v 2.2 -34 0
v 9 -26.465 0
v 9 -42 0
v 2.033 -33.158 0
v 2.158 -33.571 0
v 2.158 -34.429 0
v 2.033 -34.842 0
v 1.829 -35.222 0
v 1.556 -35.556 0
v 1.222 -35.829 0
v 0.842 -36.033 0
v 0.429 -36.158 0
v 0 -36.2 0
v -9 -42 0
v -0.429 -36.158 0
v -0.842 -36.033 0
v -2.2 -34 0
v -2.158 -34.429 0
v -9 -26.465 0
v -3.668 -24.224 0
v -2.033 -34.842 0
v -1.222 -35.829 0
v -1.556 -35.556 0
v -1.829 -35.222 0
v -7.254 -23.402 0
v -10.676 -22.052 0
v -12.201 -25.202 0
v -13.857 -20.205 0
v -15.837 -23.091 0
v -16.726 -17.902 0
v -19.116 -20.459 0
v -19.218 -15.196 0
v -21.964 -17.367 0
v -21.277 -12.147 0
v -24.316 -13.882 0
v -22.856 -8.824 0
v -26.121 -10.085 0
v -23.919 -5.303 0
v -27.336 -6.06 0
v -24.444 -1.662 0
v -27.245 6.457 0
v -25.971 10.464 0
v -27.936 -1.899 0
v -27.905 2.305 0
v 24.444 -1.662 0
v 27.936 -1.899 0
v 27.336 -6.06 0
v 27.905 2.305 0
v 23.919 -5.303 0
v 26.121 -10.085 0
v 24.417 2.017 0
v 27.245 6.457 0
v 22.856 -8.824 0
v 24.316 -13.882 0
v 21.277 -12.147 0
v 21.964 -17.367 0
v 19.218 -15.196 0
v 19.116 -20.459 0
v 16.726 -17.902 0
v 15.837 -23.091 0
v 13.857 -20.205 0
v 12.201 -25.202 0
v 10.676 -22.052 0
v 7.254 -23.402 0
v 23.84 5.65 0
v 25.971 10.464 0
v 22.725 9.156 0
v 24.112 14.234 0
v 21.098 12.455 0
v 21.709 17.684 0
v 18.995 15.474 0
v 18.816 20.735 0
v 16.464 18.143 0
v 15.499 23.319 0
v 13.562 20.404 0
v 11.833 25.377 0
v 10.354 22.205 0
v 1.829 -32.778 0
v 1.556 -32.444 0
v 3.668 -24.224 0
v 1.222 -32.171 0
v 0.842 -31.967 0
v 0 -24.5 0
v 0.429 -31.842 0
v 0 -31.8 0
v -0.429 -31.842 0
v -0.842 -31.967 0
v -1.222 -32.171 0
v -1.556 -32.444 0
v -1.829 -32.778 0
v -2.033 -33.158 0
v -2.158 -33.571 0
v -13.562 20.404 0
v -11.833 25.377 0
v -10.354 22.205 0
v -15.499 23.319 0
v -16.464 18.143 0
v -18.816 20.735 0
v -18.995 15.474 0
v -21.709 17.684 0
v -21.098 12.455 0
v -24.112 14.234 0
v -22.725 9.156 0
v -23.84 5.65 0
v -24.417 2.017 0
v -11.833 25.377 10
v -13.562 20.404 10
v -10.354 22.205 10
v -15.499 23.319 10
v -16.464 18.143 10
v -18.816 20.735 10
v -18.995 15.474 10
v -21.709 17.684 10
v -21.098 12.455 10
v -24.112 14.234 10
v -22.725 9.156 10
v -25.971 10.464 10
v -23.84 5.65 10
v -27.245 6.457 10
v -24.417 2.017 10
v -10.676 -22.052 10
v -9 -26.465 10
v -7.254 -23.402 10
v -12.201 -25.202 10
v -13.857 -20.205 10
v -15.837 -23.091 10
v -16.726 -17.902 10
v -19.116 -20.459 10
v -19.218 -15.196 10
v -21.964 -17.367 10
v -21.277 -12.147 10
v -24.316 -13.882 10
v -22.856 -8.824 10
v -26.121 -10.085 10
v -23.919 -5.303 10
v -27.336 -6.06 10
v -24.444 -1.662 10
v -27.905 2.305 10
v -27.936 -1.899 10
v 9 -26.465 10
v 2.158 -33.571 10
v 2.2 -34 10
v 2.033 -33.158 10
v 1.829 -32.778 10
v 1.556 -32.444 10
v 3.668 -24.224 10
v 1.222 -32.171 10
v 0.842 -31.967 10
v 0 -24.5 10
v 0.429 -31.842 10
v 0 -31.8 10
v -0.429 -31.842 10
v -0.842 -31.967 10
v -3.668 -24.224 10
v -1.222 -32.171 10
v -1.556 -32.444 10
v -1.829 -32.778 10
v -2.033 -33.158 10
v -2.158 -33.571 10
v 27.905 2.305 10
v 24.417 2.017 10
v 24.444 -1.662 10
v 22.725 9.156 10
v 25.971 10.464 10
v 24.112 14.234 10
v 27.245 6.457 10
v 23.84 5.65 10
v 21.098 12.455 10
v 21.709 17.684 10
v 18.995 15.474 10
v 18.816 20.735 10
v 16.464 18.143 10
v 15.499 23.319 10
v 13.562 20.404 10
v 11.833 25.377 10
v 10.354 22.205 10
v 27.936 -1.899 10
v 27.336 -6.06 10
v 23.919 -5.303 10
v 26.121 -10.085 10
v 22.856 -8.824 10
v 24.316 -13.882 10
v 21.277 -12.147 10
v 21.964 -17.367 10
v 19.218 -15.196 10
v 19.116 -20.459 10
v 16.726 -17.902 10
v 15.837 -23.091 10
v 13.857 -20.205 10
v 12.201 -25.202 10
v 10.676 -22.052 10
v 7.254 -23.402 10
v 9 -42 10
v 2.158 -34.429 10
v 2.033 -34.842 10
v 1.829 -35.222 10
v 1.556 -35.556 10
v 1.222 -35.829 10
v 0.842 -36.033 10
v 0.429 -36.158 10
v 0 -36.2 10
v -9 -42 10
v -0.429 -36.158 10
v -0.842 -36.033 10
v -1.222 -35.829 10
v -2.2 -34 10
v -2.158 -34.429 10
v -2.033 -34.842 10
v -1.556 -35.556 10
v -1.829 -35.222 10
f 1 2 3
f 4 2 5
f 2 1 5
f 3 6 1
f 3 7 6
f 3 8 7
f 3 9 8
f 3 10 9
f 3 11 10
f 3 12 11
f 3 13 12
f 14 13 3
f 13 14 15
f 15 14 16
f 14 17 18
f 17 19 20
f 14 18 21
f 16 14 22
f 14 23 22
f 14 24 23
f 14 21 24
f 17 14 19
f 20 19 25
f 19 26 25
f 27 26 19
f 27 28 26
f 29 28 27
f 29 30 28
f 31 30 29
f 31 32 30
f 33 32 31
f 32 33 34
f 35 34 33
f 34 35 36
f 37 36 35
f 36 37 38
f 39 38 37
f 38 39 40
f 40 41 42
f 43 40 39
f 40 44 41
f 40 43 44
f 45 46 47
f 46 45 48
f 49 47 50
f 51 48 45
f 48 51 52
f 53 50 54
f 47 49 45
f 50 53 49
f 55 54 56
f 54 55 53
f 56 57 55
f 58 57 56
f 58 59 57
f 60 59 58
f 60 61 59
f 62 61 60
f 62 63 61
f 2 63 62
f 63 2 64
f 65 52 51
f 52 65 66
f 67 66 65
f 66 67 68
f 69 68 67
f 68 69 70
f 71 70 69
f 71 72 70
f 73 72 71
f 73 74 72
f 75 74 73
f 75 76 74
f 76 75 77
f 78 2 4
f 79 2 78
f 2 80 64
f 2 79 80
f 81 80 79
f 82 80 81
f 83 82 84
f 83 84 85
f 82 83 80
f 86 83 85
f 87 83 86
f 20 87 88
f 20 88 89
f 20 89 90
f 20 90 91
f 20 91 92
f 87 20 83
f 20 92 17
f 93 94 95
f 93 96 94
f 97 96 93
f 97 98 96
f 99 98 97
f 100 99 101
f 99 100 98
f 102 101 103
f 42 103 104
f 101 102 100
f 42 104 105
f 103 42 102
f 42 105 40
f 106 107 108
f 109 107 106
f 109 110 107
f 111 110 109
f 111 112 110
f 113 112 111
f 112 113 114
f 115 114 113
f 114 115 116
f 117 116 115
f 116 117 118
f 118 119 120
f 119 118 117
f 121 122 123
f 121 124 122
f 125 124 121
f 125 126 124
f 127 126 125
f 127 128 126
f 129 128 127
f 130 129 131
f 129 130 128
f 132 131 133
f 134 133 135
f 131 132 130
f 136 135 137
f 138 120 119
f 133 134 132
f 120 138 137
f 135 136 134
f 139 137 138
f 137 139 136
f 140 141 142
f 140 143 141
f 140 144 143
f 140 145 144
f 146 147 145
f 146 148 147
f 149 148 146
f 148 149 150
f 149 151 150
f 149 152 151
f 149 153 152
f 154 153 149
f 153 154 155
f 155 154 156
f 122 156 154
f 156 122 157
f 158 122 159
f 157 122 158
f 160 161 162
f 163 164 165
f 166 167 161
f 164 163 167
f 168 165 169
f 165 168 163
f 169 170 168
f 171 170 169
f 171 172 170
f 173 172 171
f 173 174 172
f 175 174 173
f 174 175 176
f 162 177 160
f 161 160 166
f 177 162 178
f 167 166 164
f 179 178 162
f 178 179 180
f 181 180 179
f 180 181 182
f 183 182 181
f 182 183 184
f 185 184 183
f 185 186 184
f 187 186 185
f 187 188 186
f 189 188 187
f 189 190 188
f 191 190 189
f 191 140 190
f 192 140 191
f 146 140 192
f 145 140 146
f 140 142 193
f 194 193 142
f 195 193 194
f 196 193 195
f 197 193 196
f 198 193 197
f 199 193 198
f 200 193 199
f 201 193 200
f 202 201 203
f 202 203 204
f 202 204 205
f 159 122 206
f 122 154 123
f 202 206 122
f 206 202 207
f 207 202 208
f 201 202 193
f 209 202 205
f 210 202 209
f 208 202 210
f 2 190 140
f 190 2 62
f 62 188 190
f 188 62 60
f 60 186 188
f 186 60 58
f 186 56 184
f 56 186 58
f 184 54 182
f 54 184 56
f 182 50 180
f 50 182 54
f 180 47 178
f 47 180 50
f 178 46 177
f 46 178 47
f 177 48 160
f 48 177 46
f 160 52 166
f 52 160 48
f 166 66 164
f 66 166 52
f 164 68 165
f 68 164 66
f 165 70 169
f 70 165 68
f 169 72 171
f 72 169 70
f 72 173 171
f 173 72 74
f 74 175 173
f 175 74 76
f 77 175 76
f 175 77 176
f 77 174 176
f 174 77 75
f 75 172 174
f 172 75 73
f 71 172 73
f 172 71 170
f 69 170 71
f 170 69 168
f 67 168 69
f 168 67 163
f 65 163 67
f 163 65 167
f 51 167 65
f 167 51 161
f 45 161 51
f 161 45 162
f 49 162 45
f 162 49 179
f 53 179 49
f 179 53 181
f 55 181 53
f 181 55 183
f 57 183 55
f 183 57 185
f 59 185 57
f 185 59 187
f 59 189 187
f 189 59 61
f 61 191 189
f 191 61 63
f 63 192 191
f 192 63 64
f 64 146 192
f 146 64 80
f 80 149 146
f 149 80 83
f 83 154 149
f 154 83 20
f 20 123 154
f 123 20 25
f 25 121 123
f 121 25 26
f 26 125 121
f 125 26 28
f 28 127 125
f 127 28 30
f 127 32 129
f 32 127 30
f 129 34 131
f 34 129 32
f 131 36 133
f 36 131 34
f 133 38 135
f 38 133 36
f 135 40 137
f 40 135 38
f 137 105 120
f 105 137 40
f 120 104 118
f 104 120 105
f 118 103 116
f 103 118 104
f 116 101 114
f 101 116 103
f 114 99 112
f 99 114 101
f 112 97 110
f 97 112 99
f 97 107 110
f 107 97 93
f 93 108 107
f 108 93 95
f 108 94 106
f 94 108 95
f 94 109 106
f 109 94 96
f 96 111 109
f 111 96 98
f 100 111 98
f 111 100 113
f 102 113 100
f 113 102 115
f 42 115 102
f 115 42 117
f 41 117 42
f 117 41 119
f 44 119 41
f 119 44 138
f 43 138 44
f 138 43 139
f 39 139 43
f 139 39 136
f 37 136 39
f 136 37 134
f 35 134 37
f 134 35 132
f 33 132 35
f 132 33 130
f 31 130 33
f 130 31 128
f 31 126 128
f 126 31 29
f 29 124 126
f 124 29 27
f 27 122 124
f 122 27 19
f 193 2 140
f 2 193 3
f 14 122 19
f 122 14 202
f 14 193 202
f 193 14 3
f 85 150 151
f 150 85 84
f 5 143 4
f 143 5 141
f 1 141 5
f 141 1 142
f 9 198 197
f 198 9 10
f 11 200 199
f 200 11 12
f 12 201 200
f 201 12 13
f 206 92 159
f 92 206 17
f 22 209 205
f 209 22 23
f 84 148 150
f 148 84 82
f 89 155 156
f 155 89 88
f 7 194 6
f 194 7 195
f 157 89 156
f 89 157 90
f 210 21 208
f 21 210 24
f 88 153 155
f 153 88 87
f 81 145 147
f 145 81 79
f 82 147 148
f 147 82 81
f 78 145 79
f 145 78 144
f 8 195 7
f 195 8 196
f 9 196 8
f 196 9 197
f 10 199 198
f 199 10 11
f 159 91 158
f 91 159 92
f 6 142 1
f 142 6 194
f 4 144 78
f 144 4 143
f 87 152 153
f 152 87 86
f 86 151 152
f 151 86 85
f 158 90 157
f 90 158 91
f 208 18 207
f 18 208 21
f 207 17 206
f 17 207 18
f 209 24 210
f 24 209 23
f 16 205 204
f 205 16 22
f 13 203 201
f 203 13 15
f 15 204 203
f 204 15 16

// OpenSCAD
$fn = 32;

// ----------------------------------------------------------------------
// Spring clip: 56 mm outside, 3.5 mm band, 50 degree opening
// ----------------------------------------------------------------------

// --- parameters (mm) ---
outer_r = 28;             // clip outside radius
inner_r = 24.5;           // clip bore radius
band = 3.5;               // band thickness
clip_w = 10;              // clip width
opening = 50;             // opening angle
tab_w = 18;               // tab width
tab_len = 14;             // tab length past the clip
tab_hole = 4.4;           // tab fixing hole

clip_profile = [[-11.833, 25.377], [-15.499, 23.319], [-18.816, 20.735], [-21.709, 17.684], [-24.112, 14.234], [-25.971, 10.464], [-27.245, 6.457], [-27.905, 2.305], [-27.936, -1.899], [-27.336, -6.06], [-26.121, -10.085], [-24.316, -13.882], [-21.964, -17.367], [-19.116, -20.459], [-15.837, -23.091], [-12.201, -25.202], [-8.29, -26.745], [-4.192, -27.684], [0, -28], [4.192, -27.684], [8.29, -26.745], [12.201, -25.202], [15.837, -23.091], [19.116, -20.459], [21.964, -17.367], [24.316, -13.882], [26.121, -10.085], [27.336, -6.06], [27.936, -1.899], [27.905, 2.305], [27.245, 6.457], [25.971, 10.464], [24.112, 14.234], [21.709, 17.684], [18.816, 20.735], [15.499, 23.319], [11.833, 25.377], [10.354, 22.205], [13.562, 20.404], [16.464, 18.143], [18.995, 15.474], [21.098, 12.455], [22.725, 9.156], [23.84, 5.65], [24.417, 2.017], [24.444, -1.662], [23.919, -5.303], [22.856, -8.824], [21.277, -12.147], [19.218, -15.196], [16.726, -17.902], [13.857, -20.205], [10.676, -22.052], [7.254, -23.402], [3.668, -24.224], [0, -24.5], [-3.668, -24.224], [-7.254, -23.402], [-10.676, -22.052], [-13.857, -20.205], [-16.726, -17.902], [-19.218, -15.196], [-21.277, -12.147], [-22.856, -8.824], [-23.919, -5.303], [-24.444, -1.662], [-24.417, 2.017], [-23.84, 5.65], [-22.725, 9.156], [-21.098, 12.455], [-18.995, 15.474], [-16.464, 18.143], [-13.562, 20.404], [-10.354, 22.205]];

difference() {
  union() {
    linear_extrude(height = clip_w) polygon(clip_profile);
    /* mounting tab, sunk 2 mm into the band */
    translate([-9, -42, 0]) cube([tab_w, 16, clip_w]);
  }
  translate([0, -34, -2.5]) cylinder(h = clip_w + 5, d = tab_hole);
}
